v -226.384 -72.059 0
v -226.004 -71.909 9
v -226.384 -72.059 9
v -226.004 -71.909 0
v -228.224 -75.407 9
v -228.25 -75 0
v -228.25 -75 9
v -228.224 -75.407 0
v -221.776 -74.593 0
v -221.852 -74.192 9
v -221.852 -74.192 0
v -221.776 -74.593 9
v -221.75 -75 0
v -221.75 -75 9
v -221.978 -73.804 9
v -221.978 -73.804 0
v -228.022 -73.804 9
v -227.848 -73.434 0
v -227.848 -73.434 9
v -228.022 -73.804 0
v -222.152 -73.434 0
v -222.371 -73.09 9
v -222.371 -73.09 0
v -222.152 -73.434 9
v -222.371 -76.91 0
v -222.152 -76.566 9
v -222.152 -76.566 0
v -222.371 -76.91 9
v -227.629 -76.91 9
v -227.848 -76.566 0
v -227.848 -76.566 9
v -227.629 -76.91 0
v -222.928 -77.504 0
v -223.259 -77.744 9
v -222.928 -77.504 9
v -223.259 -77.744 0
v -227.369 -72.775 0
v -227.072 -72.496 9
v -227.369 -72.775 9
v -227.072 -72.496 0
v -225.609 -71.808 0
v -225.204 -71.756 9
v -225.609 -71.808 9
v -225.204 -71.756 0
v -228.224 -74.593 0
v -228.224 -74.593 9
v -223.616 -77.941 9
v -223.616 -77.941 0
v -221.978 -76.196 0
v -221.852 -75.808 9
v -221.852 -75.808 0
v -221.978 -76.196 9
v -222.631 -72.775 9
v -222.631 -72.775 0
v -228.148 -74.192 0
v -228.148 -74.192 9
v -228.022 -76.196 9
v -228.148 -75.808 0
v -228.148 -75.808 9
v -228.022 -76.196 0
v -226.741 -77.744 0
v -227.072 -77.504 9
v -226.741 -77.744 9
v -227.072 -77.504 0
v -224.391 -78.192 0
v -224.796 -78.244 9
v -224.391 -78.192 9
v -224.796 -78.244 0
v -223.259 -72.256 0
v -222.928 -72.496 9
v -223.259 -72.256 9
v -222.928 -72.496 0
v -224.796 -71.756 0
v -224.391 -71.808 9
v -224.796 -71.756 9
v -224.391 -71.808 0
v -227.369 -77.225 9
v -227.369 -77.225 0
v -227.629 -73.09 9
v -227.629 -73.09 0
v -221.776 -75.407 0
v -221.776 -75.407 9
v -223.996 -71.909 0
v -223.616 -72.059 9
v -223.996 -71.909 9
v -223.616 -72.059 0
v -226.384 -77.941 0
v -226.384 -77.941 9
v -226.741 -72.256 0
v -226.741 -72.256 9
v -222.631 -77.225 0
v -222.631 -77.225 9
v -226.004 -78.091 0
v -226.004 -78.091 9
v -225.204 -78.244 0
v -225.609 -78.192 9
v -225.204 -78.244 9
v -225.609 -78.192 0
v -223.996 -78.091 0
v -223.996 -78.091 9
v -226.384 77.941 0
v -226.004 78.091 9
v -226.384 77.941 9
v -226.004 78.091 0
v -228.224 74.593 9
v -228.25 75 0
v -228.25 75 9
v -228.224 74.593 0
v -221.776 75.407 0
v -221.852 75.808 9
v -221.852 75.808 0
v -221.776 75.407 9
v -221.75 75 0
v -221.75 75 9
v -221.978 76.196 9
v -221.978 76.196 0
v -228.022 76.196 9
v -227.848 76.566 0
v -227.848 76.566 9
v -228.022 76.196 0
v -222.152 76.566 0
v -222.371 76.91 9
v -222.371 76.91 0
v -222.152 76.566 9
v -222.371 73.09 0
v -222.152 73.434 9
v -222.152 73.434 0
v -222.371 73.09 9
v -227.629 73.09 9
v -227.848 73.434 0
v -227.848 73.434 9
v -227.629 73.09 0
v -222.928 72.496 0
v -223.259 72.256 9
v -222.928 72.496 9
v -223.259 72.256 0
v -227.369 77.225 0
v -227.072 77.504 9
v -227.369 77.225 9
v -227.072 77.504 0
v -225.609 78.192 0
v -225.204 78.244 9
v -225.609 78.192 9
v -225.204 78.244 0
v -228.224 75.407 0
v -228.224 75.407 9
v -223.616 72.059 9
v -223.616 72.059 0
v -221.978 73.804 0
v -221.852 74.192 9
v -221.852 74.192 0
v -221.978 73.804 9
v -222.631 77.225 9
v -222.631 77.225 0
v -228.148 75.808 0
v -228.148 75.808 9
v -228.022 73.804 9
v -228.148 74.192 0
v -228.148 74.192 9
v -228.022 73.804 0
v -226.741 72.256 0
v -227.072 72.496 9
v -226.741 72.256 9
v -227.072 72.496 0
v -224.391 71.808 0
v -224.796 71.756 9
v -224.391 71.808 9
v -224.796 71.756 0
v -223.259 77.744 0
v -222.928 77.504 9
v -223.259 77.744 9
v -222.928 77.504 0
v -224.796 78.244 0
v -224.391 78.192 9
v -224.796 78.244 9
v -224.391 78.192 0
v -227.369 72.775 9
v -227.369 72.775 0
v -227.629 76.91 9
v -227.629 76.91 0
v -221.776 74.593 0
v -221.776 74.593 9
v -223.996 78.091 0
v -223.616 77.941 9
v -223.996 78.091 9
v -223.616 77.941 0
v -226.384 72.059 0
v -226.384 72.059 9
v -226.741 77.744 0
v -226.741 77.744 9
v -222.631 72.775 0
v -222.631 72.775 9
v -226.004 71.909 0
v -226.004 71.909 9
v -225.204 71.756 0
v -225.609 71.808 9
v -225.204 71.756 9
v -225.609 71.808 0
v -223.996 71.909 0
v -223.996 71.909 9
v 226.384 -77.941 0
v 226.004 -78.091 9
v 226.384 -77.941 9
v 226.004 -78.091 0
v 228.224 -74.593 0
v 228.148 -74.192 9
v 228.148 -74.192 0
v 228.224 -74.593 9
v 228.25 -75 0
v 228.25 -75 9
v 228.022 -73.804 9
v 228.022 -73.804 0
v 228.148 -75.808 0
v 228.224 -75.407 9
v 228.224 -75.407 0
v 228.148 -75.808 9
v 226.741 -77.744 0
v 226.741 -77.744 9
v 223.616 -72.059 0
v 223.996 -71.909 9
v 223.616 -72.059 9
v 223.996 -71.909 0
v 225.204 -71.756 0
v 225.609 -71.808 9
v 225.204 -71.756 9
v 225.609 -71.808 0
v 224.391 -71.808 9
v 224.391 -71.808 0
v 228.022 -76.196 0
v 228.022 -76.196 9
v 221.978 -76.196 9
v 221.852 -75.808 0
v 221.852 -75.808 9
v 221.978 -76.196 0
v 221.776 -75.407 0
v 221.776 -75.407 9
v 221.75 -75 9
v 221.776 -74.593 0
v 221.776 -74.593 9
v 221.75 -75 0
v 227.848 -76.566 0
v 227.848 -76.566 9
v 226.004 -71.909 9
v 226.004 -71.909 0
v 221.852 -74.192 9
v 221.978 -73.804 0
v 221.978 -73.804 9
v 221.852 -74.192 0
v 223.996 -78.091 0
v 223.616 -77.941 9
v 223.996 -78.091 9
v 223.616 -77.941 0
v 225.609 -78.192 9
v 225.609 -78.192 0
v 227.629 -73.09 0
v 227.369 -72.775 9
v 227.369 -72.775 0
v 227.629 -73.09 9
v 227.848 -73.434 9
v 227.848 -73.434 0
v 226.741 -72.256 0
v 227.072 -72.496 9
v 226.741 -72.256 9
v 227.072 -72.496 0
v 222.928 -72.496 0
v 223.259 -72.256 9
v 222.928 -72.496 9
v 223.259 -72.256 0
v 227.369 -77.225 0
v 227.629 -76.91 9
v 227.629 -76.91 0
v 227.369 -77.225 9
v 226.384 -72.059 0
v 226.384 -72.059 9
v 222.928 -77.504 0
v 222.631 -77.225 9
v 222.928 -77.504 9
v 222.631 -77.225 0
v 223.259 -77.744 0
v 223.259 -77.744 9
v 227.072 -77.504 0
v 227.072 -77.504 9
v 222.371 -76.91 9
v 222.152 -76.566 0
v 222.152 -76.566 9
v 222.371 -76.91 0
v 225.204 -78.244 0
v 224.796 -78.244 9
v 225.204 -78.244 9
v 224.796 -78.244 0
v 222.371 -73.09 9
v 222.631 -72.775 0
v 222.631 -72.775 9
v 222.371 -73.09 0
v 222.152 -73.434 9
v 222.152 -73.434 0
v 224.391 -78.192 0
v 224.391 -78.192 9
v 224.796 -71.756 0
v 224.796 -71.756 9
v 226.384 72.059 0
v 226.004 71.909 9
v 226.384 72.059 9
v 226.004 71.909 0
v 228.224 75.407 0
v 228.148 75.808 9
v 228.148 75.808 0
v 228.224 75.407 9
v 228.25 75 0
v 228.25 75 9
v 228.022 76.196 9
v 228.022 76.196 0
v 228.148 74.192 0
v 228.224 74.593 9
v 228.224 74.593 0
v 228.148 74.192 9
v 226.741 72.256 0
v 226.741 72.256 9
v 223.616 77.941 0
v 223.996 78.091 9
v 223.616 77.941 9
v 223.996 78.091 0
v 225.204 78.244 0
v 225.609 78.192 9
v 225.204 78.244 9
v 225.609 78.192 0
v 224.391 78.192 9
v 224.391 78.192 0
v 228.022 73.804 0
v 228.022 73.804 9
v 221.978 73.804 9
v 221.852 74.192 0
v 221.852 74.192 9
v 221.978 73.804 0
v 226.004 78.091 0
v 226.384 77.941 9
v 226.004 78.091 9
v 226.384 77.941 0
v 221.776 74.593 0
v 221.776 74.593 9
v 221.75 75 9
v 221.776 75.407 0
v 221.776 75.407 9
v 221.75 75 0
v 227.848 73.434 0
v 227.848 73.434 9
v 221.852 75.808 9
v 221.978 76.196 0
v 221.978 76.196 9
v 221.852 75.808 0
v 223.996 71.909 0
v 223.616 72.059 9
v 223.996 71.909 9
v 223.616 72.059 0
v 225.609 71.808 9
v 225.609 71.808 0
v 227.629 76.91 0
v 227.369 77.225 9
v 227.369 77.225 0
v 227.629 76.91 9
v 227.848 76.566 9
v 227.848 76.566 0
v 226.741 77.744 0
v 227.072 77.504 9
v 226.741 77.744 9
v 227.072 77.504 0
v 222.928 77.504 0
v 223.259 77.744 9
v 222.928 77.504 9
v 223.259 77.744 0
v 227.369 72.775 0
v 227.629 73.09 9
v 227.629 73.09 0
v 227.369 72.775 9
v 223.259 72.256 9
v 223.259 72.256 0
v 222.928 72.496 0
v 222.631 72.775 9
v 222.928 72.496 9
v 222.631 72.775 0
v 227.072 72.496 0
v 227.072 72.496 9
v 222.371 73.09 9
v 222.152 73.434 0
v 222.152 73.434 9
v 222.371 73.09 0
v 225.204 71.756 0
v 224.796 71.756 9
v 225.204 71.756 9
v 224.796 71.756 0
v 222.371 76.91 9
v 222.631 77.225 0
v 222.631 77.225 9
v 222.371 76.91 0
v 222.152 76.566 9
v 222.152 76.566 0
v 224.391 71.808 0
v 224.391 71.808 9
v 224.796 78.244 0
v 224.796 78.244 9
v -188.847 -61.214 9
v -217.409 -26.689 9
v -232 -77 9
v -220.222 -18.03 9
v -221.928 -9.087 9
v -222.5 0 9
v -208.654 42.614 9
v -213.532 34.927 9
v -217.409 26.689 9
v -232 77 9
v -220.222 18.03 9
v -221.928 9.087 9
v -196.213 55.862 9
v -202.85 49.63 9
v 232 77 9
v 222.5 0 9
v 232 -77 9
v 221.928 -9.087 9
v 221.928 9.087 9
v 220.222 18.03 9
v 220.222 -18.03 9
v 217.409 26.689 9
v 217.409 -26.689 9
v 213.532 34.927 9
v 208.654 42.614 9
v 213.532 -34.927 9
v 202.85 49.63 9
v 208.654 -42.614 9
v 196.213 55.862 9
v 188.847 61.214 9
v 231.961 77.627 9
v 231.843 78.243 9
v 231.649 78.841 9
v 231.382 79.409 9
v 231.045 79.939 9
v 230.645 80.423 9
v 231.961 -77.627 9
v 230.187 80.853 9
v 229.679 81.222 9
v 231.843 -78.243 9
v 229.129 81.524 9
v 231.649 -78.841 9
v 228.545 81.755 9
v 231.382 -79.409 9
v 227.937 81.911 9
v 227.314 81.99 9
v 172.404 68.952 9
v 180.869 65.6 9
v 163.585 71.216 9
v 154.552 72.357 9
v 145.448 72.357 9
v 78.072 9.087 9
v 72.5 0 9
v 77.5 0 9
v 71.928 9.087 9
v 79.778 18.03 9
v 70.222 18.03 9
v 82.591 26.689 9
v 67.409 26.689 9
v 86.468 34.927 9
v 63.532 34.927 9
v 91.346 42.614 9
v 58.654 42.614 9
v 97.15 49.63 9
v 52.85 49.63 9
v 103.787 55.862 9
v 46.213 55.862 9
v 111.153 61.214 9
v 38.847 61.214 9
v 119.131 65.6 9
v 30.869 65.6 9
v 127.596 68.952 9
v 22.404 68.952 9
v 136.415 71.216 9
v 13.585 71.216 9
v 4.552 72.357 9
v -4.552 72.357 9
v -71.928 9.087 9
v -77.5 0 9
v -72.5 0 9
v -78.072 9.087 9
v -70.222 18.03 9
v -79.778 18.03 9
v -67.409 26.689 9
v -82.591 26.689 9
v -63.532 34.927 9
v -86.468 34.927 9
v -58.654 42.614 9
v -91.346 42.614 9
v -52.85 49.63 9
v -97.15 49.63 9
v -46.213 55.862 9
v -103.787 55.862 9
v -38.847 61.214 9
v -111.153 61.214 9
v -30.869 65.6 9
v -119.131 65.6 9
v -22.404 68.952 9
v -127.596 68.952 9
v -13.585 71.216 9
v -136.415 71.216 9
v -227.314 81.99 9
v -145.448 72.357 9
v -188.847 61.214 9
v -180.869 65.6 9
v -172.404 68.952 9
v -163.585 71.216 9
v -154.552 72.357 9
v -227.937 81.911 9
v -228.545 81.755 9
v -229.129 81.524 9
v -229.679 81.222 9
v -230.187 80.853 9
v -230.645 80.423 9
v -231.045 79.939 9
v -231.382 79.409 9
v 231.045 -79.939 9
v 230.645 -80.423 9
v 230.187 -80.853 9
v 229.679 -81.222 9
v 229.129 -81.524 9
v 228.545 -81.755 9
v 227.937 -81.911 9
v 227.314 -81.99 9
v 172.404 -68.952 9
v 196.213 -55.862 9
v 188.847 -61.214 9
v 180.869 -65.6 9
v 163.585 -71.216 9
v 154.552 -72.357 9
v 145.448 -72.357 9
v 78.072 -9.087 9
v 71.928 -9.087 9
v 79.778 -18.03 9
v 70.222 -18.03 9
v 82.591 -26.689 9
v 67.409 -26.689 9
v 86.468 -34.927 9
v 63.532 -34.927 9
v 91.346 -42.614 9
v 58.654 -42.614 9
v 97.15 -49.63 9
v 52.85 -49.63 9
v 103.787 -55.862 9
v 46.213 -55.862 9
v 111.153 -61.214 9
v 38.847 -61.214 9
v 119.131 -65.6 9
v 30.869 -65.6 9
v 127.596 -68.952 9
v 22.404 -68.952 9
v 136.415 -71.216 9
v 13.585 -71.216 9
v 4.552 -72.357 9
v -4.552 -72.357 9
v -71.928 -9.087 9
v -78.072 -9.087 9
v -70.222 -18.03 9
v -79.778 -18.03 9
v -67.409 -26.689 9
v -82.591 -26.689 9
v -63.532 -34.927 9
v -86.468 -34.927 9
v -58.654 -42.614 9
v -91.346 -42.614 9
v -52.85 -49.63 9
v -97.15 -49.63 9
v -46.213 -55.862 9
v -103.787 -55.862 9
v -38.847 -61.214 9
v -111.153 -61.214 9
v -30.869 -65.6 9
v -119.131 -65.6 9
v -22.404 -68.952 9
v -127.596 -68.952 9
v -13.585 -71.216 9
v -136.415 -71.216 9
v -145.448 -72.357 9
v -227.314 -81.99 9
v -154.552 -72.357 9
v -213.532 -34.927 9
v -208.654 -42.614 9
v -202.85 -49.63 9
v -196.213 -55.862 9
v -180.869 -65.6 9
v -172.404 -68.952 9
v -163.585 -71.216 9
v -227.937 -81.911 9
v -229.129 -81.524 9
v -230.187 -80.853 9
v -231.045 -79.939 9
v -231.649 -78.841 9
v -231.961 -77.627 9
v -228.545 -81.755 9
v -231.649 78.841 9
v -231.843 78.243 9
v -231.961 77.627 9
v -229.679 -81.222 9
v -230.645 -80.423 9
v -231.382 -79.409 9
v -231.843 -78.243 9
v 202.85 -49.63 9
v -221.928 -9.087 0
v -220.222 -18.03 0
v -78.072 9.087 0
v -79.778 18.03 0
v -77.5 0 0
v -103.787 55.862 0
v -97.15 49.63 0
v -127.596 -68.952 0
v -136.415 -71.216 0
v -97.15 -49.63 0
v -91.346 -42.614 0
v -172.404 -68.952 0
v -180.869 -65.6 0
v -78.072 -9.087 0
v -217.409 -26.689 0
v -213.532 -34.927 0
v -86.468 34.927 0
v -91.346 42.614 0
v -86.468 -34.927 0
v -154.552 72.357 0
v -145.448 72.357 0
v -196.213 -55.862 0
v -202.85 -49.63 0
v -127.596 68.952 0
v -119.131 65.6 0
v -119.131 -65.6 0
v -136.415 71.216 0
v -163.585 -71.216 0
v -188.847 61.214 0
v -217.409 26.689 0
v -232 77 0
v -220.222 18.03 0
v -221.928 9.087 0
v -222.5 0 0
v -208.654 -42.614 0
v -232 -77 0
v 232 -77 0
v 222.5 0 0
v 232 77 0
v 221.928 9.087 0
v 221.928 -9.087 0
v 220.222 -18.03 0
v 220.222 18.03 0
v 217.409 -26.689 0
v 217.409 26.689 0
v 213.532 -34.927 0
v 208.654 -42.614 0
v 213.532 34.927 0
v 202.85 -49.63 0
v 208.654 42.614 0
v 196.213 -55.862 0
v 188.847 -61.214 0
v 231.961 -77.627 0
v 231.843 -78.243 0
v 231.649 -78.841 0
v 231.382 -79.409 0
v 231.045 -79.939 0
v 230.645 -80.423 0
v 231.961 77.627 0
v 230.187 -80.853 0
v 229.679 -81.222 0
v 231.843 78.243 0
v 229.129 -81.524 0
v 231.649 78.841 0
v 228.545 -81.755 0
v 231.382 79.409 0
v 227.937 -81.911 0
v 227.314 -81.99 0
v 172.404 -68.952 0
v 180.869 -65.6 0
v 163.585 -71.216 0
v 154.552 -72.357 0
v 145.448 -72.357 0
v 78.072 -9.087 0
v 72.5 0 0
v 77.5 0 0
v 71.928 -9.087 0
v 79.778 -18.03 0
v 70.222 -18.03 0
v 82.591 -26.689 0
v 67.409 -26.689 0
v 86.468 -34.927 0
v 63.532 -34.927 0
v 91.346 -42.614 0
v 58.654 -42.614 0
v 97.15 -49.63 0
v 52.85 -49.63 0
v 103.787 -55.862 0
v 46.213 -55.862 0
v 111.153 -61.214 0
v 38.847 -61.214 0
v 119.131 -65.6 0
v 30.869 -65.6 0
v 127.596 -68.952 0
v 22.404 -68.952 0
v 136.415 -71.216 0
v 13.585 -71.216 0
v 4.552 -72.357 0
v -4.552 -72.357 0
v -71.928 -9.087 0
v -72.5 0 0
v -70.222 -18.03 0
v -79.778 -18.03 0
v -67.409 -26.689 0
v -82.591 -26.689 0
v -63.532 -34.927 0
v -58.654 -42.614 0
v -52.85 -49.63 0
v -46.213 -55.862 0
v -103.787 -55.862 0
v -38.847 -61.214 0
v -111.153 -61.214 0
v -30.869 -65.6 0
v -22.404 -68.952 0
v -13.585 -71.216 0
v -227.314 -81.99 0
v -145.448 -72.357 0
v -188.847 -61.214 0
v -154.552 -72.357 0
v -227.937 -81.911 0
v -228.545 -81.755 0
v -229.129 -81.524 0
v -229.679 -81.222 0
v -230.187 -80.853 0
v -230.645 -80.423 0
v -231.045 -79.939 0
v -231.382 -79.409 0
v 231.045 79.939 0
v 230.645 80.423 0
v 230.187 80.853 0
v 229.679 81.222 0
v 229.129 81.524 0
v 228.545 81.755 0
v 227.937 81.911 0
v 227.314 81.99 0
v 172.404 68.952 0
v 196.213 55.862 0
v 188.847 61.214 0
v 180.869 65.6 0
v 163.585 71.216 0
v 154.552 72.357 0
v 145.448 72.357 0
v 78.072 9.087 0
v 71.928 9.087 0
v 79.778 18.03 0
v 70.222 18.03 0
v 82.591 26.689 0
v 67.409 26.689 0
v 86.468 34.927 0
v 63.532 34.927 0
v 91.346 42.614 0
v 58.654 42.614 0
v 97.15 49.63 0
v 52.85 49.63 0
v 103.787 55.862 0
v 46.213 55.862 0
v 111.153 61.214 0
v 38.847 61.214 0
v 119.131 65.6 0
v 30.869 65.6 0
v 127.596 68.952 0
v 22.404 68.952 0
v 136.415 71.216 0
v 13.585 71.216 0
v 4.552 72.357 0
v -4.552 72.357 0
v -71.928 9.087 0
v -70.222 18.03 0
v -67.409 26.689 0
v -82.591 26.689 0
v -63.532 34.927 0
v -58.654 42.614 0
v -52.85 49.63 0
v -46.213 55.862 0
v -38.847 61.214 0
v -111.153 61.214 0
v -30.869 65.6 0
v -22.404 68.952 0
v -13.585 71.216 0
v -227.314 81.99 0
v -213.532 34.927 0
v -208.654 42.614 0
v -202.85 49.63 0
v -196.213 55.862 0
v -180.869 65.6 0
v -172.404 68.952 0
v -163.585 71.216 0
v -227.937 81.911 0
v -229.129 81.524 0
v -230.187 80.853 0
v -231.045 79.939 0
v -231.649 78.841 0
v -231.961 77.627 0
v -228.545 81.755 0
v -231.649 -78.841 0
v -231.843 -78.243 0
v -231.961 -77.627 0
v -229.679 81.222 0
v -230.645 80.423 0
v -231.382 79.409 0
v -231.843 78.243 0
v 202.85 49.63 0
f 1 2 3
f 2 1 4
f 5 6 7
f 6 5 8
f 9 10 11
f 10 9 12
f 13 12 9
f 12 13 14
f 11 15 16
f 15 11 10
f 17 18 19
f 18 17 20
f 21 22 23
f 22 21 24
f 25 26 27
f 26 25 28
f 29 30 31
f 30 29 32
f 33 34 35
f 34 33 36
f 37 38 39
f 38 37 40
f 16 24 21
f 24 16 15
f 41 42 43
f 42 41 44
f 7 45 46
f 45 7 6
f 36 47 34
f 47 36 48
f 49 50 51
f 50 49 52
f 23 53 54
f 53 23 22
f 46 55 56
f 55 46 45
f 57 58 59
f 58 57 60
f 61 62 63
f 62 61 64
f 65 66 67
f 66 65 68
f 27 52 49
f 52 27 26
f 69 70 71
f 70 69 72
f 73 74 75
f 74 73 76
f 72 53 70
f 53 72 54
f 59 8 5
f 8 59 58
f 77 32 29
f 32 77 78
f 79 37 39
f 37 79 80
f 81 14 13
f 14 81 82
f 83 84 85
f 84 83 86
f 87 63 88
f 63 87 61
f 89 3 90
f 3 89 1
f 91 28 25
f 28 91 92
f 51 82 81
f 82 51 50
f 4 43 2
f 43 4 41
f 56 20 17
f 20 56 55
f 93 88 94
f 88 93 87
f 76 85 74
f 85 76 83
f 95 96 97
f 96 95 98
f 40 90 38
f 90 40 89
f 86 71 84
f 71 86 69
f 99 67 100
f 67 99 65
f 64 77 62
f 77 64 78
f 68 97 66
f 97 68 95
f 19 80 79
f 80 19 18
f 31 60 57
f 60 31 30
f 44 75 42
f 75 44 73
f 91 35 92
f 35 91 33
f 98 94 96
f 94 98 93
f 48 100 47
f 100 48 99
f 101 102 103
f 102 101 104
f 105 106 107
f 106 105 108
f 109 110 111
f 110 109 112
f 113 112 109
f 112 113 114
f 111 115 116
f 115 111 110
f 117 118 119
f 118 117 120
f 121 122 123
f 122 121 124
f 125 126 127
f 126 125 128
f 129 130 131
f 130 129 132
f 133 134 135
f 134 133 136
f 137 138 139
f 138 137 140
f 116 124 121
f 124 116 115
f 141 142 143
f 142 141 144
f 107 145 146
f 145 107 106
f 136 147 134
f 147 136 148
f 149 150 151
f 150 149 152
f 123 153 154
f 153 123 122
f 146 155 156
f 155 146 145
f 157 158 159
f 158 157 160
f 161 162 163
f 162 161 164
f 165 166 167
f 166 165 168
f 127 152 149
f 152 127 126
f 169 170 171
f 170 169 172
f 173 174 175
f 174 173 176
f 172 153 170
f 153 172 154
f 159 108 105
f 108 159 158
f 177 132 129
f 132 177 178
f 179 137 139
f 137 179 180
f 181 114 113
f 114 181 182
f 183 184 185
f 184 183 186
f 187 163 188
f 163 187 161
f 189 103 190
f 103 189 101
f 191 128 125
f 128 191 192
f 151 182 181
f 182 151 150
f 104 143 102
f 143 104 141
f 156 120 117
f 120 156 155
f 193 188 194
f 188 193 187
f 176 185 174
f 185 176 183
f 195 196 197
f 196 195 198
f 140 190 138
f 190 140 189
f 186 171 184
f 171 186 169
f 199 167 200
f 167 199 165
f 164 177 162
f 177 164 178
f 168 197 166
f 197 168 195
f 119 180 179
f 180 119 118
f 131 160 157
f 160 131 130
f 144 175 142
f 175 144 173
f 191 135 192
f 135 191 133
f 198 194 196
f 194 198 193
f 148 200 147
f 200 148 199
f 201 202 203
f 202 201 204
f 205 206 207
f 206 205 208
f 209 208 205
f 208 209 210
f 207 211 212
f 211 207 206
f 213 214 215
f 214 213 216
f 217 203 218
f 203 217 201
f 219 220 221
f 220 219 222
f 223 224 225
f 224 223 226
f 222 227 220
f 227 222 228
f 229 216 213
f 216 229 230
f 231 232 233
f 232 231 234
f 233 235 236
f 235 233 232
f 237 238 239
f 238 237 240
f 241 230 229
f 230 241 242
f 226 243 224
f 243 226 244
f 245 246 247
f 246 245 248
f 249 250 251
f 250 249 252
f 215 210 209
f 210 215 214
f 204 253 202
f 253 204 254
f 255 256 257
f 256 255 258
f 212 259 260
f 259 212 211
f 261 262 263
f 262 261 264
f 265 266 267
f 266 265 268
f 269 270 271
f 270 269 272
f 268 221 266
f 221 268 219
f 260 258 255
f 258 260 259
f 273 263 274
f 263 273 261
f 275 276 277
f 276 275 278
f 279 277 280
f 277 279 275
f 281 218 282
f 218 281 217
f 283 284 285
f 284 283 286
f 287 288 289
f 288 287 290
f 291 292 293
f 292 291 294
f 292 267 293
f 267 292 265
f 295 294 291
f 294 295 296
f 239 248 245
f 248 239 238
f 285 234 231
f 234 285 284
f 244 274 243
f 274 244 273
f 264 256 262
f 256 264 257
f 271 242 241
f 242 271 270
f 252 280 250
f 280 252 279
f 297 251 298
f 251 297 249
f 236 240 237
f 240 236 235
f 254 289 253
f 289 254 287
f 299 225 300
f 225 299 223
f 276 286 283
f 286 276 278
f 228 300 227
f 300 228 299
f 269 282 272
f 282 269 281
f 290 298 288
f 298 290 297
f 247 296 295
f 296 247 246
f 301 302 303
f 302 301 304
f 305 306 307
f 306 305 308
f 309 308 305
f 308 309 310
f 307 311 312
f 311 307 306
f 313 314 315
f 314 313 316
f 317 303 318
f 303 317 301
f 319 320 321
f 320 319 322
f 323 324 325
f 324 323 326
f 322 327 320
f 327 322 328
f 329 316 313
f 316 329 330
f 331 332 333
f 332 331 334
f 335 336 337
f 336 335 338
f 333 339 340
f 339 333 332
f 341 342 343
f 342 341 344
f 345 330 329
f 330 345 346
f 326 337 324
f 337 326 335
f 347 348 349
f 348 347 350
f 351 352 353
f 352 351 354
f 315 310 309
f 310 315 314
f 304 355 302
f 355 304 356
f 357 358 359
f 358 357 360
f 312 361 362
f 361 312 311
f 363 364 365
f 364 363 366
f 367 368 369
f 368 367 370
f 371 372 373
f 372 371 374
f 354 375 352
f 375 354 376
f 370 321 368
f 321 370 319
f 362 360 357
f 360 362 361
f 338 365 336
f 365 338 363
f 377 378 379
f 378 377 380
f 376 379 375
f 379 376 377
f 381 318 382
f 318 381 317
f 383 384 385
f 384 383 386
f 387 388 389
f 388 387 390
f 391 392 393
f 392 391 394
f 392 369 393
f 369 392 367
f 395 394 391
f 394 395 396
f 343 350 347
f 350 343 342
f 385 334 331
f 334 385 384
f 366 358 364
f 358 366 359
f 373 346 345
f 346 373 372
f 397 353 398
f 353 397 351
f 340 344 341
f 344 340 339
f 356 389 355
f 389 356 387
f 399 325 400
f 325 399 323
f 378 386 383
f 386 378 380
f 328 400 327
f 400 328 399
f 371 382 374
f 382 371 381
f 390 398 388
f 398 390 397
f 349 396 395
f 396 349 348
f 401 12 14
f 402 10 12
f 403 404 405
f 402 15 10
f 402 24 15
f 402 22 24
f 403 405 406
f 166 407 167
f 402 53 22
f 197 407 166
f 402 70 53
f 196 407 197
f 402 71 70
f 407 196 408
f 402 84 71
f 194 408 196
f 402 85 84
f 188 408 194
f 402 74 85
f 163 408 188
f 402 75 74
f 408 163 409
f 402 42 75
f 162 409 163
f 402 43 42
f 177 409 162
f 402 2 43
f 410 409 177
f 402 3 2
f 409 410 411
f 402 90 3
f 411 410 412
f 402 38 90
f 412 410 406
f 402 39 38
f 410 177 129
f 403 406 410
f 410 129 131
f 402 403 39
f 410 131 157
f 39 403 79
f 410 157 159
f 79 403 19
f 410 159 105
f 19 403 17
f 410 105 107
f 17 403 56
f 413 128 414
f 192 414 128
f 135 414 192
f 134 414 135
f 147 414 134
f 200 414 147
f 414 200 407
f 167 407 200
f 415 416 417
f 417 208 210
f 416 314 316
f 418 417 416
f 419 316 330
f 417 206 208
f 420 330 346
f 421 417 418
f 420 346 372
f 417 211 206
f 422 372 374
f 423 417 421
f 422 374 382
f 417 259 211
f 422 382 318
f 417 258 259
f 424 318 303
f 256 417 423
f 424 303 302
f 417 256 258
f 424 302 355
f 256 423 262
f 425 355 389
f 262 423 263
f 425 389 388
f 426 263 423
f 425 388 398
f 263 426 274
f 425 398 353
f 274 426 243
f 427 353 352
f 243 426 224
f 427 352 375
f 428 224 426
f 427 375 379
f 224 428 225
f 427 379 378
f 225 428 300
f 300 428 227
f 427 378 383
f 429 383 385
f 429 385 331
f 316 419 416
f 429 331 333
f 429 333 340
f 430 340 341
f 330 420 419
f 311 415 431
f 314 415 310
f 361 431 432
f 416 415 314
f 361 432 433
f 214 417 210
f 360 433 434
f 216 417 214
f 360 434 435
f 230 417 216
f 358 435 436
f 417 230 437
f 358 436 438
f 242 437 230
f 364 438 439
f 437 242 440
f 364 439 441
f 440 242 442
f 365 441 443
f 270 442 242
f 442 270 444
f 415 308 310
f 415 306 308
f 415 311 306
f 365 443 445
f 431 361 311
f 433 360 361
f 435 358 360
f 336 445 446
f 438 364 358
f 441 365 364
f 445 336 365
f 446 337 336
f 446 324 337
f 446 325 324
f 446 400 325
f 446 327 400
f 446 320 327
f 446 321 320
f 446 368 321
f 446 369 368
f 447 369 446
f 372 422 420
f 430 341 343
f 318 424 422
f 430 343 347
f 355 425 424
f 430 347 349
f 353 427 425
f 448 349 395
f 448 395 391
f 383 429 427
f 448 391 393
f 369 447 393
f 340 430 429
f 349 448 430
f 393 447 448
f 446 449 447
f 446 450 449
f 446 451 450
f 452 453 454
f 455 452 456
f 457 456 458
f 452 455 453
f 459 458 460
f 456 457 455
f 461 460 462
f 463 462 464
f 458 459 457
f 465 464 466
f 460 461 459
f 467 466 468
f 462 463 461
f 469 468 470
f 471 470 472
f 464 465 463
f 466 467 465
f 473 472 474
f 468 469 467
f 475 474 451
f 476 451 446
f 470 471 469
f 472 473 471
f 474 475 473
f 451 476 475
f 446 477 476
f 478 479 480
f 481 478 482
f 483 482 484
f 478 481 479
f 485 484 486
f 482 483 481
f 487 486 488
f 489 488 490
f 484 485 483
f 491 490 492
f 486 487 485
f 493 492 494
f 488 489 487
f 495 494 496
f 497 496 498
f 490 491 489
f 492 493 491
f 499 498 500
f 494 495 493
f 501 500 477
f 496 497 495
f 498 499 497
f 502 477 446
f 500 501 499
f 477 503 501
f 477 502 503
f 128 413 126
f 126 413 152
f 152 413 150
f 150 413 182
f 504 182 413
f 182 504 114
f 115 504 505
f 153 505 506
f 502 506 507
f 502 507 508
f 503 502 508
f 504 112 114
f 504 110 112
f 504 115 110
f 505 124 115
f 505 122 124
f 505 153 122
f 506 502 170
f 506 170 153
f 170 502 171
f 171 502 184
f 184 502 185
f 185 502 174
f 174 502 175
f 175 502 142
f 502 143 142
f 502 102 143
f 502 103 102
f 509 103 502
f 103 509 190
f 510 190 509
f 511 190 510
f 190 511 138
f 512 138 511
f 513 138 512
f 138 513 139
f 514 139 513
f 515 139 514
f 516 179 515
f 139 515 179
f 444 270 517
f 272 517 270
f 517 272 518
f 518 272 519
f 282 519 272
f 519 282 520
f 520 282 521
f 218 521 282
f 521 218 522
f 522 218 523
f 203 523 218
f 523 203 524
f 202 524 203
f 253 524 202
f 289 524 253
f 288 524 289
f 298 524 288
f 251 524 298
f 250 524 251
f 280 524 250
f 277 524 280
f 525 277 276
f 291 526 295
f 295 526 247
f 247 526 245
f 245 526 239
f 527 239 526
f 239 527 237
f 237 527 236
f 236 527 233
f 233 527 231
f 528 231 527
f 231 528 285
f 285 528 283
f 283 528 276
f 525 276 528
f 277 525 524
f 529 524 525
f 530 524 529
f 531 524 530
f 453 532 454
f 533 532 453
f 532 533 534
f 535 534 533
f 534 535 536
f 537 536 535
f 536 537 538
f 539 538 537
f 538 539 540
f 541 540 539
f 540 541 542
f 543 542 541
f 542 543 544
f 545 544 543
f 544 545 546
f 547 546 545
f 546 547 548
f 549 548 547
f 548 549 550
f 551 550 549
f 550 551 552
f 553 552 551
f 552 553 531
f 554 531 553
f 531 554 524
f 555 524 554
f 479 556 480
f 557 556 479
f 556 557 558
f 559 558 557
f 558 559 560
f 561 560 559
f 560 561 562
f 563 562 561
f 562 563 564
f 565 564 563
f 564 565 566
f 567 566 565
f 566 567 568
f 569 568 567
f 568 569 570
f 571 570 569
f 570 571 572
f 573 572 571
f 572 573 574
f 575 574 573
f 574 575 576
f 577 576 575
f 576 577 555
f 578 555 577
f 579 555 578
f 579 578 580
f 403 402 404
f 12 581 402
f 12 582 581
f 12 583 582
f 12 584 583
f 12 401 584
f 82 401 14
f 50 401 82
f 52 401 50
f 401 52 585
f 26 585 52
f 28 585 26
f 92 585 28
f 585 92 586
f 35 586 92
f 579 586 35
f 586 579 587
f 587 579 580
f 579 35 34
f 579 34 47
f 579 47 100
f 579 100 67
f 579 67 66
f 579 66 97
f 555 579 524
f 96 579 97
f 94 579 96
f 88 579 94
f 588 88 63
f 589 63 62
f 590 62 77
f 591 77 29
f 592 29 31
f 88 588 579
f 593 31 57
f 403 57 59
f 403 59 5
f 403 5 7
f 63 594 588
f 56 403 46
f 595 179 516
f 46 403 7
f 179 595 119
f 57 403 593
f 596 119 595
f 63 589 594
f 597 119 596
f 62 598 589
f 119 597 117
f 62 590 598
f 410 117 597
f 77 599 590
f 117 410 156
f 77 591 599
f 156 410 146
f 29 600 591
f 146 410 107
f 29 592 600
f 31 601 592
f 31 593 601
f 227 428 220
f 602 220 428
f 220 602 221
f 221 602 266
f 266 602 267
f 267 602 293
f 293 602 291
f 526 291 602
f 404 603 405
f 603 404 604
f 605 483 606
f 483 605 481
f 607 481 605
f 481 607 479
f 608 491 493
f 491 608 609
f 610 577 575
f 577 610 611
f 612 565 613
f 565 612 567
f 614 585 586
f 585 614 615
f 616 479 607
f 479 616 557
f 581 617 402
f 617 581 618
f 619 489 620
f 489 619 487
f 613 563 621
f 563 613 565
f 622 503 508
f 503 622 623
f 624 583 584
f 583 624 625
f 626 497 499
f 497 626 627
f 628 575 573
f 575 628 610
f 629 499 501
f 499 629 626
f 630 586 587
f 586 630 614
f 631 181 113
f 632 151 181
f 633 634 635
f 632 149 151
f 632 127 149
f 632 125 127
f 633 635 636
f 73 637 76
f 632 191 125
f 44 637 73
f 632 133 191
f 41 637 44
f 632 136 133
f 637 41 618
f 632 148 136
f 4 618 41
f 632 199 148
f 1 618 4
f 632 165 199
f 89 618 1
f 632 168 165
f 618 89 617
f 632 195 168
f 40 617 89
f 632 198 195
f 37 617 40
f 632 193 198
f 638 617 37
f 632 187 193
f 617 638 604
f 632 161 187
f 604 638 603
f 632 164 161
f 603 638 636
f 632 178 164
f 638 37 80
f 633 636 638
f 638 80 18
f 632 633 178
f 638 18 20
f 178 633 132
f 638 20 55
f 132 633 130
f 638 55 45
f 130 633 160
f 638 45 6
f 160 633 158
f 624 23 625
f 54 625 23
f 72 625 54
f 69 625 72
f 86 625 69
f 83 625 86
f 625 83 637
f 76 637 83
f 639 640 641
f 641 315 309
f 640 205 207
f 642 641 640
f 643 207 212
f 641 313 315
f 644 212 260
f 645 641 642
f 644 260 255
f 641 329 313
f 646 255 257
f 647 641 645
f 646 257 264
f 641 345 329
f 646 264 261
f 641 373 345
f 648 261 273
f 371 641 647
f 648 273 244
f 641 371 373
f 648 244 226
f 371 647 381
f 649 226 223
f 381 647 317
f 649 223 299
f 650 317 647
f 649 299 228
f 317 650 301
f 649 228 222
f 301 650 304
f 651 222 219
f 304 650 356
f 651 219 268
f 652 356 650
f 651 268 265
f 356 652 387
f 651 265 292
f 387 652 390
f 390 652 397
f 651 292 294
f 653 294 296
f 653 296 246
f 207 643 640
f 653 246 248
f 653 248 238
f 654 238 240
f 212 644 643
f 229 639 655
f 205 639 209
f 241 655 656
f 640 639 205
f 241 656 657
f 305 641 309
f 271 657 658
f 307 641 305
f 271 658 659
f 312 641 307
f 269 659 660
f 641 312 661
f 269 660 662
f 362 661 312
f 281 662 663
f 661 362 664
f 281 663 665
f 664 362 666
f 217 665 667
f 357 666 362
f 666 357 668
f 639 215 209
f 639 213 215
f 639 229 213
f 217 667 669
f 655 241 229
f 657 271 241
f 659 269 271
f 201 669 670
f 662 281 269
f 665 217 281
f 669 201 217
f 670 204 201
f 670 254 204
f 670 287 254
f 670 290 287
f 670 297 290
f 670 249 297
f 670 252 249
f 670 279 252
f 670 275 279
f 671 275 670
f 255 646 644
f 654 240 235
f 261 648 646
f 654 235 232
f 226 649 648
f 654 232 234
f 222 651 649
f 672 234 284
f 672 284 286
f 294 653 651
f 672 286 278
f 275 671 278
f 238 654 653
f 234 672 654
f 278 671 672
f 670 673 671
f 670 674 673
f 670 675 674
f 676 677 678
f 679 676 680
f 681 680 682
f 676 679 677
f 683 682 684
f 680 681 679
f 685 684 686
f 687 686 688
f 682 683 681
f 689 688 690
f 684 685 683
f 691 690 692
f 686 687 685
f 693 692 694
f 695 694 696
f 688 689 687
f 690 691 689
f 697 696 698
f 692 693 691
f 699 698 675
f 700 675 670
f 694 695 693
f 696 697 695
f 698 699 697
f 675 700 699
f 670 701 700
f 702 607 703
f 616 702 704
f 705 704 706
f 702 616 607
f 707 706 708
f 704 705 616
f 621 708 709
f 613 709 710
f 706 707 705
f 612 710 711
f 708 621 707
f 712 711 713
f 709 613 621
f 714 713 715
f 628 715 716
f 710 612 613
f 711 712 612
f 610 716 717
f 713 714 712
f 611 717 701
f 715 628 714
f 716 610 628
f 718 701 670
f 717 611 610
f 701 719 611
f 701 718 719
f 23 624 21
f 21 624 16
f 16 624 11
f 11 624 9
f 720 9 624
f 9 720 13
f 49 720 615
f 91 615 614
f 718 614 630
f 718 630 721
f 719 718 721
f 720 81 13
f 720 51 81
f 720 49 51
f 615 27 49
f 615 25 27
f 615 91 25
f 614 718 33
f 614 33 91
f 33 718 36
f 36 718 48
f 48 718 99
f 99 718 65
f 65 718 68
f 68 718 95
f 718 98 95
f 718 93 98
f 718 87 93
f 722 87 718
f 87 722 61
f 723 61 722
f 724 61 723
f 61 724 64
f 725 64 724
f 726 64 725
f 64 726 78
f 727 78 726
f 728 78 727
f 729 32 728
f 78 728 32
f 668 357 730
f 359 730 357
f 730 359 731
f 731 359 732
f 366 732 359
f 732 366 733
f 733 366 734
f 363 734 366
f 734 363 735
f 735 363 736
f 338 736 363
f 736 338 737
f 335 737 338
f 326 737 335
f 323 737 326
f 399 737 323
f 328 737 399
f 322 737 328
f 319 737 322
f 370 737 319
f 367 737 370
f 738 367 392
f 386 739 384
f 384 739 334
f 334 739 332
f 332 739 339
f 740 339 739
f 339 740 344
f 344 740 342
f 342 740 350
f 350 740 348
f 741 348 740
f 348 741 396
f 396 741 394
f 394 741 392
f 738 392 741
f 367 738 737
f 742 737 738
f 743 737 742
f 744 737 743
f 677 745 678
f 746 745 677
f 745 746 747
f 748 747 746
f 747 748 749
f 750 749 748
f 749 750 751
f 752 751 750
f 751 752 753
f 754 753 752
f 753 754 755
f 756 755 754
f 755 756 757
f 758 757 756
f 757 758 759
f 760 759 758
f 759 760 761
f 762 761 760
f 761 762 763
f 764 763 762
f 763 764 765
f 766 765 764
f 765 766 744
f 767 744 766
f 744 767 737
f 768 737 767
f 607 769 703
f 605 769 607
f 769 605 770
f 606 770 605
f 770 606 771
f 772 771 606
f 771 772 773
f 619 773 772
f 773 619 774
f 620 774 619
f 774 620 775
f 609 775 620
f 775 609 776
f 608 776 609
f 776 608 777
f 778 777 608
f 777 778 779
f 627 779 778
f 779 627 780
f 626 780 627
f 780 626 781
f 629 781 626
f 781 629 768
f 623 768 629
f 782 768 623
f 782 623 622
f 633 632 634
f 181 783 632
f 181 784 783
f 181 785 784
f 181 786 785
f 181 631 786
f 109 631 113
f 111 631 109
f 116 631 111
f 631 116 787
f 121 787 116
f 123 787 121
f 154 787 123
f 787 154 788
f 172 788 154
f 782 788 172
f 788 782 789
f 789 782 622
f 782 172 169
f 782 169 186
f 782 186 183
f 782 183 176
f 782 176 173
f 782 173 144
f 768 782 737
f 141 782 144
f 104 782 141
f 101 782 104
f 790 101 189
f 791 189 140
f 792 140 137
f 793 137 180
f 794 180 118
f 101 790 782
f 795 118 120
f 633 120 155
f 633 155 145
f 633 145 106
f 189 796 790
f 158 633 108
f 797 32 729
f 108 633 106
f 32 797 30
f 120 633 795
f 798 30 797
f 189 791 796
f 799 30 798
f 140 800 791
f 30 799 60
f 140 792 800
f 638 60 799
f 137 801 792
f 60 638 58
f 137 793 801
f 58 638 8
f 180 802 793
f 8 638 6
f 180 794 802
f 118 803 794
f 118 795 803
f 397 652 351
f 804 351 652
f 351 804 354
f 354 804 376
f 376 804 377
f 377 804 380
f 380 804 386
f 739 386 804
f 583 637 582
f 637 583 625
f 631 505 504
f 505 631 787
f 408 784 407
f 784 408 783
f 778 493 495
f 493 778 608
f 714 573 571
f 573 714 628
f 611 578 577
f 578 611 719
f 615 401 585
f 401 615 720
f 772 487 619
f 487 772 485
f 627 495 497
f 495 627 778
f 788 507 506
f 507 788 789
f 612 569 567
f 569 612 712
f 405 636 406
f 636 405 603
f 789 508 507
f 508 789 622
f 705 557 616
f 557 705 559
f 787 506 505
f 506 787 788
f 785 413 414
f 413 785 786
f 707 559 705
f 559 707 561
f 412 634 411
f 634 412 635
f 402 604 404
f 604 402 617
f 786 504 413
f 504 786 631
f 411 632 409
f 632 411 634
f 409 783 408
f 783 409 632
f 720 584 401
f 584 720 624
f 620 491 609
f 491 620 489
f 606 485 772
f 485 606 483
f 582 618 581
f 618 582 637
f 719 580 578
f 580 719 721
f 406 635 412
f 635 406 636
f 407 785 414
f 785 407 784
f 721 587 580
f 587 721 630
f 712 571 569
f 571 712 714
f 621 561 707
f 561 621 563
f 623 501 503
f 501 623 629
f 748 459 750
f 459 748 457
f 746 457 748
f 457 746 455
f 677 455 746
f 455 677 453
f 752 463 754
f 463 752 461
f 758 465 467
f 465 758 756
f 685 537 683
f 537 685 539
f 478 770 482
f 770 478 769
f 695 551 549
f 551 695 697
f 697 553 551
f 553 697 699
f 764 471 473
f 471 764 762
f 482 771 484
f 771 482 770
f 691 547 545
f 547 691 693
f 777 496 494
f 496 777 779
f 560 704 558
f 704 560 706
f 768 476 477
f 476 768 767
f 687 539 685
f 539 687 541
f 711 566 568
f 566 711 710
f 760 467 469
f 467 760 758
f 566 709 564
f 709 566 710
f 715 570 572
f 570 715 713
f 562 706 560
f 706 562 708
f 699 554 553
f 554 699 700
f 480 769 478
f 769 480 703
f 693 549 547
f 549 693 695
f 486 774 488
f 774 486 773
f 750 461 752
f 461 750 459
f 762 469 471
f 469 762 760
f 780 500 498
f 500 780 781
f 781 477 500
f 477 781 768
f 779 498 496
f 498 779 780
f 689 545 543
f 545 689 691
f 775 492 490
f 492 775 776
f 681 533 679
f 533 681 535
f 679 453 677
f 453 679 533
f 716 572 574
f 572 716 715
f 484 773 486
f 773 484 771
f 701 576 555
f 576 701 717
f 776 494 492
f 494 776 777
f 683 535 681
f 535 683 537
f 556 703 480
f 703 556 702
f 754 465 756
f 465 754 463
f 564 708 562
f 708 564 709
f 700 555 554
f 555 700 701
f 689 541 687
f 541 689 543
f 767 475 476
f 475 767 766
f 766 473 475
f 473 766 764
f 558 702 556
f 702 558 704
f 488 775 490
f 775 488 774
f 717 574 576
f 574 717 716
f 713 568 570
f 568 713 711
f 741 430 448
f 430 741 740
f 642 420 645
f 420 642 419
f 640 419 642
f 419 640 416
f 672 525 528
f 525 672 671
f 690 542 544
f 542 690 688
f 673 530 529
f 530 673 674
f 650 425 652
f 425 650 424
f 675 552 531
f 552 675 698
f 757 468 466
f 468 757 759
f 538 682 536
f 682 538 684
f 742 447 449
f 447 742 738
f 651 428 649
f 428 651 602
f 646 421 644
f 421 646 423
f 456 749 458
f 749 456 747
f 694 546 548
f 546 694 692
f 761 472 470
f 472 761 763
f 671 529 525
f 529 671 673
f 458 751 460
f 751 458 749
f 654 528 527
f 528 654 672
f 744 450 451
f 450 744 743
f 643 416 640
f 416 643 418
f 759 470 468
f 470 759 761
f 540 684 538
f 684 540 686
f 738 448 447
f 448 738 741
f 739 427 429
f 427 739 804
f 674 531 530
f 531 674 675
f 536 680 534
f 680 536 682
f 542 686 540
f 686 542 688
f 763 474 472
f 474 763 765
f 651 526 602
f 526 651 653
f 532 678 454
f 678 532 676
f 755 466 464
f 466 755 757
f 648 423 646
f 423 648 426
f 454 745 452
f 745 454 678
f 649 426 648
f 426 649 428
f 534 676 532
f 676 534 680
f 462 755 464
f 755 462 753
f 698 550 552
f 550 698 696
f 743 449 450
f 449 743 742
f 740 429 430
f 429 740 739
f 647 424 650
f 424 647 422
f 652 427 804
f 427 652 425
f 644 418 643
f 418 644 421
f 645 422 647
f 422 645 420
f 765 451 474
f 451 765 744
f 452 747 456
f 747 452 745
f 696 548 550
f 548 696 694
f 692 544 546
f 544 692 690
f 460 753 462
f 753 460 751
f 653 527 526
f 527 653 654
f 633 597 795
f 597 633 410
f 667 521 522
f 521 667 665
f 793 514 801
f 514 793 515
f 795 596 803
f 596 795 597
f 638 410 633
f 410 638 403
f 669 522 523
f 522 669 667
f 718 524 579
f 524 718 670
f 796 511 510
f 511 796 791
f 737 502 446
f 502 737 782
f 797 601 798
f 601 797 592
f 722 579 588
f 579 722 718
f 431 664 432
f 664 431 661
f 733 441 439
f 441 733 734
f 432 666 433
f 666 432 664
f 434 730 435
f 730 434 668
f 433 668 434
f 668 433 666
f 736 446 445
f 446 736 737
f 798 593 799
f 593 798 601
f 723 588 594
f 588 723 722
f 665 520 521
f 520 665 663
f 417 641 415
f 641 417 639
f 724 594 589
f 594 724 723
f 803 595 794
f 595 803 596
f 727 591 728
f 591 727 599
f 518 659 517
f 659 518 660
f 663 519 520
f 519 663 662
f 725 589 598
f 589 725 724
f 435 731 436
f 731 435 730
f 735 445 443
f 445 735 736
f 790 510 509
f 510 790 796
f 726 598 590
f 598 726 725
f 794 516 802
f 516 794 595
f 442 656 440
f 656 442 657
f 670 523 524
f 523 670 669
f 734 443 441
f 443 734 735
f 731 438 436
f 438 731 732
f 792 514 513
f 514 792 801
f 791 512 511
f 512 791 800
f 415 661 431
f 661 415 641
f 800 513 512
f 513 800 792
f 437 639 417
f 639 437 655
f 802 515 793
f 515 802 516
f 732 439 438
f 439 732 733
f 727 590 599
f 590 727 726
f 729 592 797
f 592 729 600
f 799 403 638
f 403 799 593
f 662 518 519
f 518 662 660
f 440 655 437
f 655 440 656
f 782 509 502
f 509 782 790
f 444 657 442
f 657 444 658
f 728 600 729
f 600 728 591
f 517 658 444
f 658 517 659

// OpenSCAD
$fn = 50;

difference() {
	union() {
		hull() {
			translate(v = [-227.0, 77.0, 0]) {
				cylinder(h = 9, r = 5);
			}
			translate(v = [227.0, 77.0, 0]) {
				cylinder(h = 9, r = 5);
			}
			translate(v = [-227.0, -77.0, 0]) {
				cylinder(h = 9, r = 5);
			}
			translate(v = [227.0, -77.0, 0]) {
				cylinder(h = 9, r = 5);
			}
		}
	}
	union() {
		translate(v = [-225.0, -75.0, -100.0]) {
			cylinder(h = 200, r = 3.25);
		}
		translate(v = [-225.0, 75.0, -100.0]) {
			cylinder(h = 200, r = 3.25);
		}
		translate(v = [225.0, -75.0, -100.0]) {
			cylinder(h = 200, r = 3.25);
		}
		translate(v = [225.0, 75.0, -100.0]) {
			cylinder(h = 200, r = 3.25);
		}
		translate(v = [-225.0, -75.0, -100.0]) {
			cylinder(h = 200, r = 1.8);
		}
		translate(v = [-225.0, 75.0, -100.0]) {
			cylinder(h = 200, r = 1.8);
		}
		translate(v = [225.0, -75.0, -100.0]) {
			cylinder(h = 200, r = 1.8);
		}
		translate(v = [225.0, 75.0, -100.0]) {
			cylinder(h = 200, r = 1.8);
		}
		translate(v = [-150.0, 0, 0.0]) {
			cylinder(h = 9, r = 72.5);
		}
		cylinder(h = 9, r = 72.5);
		translate(v = [150.0, 0, 0.0]) {
			cylinder(h = 9, r = 72.5);
		}
	}
}
